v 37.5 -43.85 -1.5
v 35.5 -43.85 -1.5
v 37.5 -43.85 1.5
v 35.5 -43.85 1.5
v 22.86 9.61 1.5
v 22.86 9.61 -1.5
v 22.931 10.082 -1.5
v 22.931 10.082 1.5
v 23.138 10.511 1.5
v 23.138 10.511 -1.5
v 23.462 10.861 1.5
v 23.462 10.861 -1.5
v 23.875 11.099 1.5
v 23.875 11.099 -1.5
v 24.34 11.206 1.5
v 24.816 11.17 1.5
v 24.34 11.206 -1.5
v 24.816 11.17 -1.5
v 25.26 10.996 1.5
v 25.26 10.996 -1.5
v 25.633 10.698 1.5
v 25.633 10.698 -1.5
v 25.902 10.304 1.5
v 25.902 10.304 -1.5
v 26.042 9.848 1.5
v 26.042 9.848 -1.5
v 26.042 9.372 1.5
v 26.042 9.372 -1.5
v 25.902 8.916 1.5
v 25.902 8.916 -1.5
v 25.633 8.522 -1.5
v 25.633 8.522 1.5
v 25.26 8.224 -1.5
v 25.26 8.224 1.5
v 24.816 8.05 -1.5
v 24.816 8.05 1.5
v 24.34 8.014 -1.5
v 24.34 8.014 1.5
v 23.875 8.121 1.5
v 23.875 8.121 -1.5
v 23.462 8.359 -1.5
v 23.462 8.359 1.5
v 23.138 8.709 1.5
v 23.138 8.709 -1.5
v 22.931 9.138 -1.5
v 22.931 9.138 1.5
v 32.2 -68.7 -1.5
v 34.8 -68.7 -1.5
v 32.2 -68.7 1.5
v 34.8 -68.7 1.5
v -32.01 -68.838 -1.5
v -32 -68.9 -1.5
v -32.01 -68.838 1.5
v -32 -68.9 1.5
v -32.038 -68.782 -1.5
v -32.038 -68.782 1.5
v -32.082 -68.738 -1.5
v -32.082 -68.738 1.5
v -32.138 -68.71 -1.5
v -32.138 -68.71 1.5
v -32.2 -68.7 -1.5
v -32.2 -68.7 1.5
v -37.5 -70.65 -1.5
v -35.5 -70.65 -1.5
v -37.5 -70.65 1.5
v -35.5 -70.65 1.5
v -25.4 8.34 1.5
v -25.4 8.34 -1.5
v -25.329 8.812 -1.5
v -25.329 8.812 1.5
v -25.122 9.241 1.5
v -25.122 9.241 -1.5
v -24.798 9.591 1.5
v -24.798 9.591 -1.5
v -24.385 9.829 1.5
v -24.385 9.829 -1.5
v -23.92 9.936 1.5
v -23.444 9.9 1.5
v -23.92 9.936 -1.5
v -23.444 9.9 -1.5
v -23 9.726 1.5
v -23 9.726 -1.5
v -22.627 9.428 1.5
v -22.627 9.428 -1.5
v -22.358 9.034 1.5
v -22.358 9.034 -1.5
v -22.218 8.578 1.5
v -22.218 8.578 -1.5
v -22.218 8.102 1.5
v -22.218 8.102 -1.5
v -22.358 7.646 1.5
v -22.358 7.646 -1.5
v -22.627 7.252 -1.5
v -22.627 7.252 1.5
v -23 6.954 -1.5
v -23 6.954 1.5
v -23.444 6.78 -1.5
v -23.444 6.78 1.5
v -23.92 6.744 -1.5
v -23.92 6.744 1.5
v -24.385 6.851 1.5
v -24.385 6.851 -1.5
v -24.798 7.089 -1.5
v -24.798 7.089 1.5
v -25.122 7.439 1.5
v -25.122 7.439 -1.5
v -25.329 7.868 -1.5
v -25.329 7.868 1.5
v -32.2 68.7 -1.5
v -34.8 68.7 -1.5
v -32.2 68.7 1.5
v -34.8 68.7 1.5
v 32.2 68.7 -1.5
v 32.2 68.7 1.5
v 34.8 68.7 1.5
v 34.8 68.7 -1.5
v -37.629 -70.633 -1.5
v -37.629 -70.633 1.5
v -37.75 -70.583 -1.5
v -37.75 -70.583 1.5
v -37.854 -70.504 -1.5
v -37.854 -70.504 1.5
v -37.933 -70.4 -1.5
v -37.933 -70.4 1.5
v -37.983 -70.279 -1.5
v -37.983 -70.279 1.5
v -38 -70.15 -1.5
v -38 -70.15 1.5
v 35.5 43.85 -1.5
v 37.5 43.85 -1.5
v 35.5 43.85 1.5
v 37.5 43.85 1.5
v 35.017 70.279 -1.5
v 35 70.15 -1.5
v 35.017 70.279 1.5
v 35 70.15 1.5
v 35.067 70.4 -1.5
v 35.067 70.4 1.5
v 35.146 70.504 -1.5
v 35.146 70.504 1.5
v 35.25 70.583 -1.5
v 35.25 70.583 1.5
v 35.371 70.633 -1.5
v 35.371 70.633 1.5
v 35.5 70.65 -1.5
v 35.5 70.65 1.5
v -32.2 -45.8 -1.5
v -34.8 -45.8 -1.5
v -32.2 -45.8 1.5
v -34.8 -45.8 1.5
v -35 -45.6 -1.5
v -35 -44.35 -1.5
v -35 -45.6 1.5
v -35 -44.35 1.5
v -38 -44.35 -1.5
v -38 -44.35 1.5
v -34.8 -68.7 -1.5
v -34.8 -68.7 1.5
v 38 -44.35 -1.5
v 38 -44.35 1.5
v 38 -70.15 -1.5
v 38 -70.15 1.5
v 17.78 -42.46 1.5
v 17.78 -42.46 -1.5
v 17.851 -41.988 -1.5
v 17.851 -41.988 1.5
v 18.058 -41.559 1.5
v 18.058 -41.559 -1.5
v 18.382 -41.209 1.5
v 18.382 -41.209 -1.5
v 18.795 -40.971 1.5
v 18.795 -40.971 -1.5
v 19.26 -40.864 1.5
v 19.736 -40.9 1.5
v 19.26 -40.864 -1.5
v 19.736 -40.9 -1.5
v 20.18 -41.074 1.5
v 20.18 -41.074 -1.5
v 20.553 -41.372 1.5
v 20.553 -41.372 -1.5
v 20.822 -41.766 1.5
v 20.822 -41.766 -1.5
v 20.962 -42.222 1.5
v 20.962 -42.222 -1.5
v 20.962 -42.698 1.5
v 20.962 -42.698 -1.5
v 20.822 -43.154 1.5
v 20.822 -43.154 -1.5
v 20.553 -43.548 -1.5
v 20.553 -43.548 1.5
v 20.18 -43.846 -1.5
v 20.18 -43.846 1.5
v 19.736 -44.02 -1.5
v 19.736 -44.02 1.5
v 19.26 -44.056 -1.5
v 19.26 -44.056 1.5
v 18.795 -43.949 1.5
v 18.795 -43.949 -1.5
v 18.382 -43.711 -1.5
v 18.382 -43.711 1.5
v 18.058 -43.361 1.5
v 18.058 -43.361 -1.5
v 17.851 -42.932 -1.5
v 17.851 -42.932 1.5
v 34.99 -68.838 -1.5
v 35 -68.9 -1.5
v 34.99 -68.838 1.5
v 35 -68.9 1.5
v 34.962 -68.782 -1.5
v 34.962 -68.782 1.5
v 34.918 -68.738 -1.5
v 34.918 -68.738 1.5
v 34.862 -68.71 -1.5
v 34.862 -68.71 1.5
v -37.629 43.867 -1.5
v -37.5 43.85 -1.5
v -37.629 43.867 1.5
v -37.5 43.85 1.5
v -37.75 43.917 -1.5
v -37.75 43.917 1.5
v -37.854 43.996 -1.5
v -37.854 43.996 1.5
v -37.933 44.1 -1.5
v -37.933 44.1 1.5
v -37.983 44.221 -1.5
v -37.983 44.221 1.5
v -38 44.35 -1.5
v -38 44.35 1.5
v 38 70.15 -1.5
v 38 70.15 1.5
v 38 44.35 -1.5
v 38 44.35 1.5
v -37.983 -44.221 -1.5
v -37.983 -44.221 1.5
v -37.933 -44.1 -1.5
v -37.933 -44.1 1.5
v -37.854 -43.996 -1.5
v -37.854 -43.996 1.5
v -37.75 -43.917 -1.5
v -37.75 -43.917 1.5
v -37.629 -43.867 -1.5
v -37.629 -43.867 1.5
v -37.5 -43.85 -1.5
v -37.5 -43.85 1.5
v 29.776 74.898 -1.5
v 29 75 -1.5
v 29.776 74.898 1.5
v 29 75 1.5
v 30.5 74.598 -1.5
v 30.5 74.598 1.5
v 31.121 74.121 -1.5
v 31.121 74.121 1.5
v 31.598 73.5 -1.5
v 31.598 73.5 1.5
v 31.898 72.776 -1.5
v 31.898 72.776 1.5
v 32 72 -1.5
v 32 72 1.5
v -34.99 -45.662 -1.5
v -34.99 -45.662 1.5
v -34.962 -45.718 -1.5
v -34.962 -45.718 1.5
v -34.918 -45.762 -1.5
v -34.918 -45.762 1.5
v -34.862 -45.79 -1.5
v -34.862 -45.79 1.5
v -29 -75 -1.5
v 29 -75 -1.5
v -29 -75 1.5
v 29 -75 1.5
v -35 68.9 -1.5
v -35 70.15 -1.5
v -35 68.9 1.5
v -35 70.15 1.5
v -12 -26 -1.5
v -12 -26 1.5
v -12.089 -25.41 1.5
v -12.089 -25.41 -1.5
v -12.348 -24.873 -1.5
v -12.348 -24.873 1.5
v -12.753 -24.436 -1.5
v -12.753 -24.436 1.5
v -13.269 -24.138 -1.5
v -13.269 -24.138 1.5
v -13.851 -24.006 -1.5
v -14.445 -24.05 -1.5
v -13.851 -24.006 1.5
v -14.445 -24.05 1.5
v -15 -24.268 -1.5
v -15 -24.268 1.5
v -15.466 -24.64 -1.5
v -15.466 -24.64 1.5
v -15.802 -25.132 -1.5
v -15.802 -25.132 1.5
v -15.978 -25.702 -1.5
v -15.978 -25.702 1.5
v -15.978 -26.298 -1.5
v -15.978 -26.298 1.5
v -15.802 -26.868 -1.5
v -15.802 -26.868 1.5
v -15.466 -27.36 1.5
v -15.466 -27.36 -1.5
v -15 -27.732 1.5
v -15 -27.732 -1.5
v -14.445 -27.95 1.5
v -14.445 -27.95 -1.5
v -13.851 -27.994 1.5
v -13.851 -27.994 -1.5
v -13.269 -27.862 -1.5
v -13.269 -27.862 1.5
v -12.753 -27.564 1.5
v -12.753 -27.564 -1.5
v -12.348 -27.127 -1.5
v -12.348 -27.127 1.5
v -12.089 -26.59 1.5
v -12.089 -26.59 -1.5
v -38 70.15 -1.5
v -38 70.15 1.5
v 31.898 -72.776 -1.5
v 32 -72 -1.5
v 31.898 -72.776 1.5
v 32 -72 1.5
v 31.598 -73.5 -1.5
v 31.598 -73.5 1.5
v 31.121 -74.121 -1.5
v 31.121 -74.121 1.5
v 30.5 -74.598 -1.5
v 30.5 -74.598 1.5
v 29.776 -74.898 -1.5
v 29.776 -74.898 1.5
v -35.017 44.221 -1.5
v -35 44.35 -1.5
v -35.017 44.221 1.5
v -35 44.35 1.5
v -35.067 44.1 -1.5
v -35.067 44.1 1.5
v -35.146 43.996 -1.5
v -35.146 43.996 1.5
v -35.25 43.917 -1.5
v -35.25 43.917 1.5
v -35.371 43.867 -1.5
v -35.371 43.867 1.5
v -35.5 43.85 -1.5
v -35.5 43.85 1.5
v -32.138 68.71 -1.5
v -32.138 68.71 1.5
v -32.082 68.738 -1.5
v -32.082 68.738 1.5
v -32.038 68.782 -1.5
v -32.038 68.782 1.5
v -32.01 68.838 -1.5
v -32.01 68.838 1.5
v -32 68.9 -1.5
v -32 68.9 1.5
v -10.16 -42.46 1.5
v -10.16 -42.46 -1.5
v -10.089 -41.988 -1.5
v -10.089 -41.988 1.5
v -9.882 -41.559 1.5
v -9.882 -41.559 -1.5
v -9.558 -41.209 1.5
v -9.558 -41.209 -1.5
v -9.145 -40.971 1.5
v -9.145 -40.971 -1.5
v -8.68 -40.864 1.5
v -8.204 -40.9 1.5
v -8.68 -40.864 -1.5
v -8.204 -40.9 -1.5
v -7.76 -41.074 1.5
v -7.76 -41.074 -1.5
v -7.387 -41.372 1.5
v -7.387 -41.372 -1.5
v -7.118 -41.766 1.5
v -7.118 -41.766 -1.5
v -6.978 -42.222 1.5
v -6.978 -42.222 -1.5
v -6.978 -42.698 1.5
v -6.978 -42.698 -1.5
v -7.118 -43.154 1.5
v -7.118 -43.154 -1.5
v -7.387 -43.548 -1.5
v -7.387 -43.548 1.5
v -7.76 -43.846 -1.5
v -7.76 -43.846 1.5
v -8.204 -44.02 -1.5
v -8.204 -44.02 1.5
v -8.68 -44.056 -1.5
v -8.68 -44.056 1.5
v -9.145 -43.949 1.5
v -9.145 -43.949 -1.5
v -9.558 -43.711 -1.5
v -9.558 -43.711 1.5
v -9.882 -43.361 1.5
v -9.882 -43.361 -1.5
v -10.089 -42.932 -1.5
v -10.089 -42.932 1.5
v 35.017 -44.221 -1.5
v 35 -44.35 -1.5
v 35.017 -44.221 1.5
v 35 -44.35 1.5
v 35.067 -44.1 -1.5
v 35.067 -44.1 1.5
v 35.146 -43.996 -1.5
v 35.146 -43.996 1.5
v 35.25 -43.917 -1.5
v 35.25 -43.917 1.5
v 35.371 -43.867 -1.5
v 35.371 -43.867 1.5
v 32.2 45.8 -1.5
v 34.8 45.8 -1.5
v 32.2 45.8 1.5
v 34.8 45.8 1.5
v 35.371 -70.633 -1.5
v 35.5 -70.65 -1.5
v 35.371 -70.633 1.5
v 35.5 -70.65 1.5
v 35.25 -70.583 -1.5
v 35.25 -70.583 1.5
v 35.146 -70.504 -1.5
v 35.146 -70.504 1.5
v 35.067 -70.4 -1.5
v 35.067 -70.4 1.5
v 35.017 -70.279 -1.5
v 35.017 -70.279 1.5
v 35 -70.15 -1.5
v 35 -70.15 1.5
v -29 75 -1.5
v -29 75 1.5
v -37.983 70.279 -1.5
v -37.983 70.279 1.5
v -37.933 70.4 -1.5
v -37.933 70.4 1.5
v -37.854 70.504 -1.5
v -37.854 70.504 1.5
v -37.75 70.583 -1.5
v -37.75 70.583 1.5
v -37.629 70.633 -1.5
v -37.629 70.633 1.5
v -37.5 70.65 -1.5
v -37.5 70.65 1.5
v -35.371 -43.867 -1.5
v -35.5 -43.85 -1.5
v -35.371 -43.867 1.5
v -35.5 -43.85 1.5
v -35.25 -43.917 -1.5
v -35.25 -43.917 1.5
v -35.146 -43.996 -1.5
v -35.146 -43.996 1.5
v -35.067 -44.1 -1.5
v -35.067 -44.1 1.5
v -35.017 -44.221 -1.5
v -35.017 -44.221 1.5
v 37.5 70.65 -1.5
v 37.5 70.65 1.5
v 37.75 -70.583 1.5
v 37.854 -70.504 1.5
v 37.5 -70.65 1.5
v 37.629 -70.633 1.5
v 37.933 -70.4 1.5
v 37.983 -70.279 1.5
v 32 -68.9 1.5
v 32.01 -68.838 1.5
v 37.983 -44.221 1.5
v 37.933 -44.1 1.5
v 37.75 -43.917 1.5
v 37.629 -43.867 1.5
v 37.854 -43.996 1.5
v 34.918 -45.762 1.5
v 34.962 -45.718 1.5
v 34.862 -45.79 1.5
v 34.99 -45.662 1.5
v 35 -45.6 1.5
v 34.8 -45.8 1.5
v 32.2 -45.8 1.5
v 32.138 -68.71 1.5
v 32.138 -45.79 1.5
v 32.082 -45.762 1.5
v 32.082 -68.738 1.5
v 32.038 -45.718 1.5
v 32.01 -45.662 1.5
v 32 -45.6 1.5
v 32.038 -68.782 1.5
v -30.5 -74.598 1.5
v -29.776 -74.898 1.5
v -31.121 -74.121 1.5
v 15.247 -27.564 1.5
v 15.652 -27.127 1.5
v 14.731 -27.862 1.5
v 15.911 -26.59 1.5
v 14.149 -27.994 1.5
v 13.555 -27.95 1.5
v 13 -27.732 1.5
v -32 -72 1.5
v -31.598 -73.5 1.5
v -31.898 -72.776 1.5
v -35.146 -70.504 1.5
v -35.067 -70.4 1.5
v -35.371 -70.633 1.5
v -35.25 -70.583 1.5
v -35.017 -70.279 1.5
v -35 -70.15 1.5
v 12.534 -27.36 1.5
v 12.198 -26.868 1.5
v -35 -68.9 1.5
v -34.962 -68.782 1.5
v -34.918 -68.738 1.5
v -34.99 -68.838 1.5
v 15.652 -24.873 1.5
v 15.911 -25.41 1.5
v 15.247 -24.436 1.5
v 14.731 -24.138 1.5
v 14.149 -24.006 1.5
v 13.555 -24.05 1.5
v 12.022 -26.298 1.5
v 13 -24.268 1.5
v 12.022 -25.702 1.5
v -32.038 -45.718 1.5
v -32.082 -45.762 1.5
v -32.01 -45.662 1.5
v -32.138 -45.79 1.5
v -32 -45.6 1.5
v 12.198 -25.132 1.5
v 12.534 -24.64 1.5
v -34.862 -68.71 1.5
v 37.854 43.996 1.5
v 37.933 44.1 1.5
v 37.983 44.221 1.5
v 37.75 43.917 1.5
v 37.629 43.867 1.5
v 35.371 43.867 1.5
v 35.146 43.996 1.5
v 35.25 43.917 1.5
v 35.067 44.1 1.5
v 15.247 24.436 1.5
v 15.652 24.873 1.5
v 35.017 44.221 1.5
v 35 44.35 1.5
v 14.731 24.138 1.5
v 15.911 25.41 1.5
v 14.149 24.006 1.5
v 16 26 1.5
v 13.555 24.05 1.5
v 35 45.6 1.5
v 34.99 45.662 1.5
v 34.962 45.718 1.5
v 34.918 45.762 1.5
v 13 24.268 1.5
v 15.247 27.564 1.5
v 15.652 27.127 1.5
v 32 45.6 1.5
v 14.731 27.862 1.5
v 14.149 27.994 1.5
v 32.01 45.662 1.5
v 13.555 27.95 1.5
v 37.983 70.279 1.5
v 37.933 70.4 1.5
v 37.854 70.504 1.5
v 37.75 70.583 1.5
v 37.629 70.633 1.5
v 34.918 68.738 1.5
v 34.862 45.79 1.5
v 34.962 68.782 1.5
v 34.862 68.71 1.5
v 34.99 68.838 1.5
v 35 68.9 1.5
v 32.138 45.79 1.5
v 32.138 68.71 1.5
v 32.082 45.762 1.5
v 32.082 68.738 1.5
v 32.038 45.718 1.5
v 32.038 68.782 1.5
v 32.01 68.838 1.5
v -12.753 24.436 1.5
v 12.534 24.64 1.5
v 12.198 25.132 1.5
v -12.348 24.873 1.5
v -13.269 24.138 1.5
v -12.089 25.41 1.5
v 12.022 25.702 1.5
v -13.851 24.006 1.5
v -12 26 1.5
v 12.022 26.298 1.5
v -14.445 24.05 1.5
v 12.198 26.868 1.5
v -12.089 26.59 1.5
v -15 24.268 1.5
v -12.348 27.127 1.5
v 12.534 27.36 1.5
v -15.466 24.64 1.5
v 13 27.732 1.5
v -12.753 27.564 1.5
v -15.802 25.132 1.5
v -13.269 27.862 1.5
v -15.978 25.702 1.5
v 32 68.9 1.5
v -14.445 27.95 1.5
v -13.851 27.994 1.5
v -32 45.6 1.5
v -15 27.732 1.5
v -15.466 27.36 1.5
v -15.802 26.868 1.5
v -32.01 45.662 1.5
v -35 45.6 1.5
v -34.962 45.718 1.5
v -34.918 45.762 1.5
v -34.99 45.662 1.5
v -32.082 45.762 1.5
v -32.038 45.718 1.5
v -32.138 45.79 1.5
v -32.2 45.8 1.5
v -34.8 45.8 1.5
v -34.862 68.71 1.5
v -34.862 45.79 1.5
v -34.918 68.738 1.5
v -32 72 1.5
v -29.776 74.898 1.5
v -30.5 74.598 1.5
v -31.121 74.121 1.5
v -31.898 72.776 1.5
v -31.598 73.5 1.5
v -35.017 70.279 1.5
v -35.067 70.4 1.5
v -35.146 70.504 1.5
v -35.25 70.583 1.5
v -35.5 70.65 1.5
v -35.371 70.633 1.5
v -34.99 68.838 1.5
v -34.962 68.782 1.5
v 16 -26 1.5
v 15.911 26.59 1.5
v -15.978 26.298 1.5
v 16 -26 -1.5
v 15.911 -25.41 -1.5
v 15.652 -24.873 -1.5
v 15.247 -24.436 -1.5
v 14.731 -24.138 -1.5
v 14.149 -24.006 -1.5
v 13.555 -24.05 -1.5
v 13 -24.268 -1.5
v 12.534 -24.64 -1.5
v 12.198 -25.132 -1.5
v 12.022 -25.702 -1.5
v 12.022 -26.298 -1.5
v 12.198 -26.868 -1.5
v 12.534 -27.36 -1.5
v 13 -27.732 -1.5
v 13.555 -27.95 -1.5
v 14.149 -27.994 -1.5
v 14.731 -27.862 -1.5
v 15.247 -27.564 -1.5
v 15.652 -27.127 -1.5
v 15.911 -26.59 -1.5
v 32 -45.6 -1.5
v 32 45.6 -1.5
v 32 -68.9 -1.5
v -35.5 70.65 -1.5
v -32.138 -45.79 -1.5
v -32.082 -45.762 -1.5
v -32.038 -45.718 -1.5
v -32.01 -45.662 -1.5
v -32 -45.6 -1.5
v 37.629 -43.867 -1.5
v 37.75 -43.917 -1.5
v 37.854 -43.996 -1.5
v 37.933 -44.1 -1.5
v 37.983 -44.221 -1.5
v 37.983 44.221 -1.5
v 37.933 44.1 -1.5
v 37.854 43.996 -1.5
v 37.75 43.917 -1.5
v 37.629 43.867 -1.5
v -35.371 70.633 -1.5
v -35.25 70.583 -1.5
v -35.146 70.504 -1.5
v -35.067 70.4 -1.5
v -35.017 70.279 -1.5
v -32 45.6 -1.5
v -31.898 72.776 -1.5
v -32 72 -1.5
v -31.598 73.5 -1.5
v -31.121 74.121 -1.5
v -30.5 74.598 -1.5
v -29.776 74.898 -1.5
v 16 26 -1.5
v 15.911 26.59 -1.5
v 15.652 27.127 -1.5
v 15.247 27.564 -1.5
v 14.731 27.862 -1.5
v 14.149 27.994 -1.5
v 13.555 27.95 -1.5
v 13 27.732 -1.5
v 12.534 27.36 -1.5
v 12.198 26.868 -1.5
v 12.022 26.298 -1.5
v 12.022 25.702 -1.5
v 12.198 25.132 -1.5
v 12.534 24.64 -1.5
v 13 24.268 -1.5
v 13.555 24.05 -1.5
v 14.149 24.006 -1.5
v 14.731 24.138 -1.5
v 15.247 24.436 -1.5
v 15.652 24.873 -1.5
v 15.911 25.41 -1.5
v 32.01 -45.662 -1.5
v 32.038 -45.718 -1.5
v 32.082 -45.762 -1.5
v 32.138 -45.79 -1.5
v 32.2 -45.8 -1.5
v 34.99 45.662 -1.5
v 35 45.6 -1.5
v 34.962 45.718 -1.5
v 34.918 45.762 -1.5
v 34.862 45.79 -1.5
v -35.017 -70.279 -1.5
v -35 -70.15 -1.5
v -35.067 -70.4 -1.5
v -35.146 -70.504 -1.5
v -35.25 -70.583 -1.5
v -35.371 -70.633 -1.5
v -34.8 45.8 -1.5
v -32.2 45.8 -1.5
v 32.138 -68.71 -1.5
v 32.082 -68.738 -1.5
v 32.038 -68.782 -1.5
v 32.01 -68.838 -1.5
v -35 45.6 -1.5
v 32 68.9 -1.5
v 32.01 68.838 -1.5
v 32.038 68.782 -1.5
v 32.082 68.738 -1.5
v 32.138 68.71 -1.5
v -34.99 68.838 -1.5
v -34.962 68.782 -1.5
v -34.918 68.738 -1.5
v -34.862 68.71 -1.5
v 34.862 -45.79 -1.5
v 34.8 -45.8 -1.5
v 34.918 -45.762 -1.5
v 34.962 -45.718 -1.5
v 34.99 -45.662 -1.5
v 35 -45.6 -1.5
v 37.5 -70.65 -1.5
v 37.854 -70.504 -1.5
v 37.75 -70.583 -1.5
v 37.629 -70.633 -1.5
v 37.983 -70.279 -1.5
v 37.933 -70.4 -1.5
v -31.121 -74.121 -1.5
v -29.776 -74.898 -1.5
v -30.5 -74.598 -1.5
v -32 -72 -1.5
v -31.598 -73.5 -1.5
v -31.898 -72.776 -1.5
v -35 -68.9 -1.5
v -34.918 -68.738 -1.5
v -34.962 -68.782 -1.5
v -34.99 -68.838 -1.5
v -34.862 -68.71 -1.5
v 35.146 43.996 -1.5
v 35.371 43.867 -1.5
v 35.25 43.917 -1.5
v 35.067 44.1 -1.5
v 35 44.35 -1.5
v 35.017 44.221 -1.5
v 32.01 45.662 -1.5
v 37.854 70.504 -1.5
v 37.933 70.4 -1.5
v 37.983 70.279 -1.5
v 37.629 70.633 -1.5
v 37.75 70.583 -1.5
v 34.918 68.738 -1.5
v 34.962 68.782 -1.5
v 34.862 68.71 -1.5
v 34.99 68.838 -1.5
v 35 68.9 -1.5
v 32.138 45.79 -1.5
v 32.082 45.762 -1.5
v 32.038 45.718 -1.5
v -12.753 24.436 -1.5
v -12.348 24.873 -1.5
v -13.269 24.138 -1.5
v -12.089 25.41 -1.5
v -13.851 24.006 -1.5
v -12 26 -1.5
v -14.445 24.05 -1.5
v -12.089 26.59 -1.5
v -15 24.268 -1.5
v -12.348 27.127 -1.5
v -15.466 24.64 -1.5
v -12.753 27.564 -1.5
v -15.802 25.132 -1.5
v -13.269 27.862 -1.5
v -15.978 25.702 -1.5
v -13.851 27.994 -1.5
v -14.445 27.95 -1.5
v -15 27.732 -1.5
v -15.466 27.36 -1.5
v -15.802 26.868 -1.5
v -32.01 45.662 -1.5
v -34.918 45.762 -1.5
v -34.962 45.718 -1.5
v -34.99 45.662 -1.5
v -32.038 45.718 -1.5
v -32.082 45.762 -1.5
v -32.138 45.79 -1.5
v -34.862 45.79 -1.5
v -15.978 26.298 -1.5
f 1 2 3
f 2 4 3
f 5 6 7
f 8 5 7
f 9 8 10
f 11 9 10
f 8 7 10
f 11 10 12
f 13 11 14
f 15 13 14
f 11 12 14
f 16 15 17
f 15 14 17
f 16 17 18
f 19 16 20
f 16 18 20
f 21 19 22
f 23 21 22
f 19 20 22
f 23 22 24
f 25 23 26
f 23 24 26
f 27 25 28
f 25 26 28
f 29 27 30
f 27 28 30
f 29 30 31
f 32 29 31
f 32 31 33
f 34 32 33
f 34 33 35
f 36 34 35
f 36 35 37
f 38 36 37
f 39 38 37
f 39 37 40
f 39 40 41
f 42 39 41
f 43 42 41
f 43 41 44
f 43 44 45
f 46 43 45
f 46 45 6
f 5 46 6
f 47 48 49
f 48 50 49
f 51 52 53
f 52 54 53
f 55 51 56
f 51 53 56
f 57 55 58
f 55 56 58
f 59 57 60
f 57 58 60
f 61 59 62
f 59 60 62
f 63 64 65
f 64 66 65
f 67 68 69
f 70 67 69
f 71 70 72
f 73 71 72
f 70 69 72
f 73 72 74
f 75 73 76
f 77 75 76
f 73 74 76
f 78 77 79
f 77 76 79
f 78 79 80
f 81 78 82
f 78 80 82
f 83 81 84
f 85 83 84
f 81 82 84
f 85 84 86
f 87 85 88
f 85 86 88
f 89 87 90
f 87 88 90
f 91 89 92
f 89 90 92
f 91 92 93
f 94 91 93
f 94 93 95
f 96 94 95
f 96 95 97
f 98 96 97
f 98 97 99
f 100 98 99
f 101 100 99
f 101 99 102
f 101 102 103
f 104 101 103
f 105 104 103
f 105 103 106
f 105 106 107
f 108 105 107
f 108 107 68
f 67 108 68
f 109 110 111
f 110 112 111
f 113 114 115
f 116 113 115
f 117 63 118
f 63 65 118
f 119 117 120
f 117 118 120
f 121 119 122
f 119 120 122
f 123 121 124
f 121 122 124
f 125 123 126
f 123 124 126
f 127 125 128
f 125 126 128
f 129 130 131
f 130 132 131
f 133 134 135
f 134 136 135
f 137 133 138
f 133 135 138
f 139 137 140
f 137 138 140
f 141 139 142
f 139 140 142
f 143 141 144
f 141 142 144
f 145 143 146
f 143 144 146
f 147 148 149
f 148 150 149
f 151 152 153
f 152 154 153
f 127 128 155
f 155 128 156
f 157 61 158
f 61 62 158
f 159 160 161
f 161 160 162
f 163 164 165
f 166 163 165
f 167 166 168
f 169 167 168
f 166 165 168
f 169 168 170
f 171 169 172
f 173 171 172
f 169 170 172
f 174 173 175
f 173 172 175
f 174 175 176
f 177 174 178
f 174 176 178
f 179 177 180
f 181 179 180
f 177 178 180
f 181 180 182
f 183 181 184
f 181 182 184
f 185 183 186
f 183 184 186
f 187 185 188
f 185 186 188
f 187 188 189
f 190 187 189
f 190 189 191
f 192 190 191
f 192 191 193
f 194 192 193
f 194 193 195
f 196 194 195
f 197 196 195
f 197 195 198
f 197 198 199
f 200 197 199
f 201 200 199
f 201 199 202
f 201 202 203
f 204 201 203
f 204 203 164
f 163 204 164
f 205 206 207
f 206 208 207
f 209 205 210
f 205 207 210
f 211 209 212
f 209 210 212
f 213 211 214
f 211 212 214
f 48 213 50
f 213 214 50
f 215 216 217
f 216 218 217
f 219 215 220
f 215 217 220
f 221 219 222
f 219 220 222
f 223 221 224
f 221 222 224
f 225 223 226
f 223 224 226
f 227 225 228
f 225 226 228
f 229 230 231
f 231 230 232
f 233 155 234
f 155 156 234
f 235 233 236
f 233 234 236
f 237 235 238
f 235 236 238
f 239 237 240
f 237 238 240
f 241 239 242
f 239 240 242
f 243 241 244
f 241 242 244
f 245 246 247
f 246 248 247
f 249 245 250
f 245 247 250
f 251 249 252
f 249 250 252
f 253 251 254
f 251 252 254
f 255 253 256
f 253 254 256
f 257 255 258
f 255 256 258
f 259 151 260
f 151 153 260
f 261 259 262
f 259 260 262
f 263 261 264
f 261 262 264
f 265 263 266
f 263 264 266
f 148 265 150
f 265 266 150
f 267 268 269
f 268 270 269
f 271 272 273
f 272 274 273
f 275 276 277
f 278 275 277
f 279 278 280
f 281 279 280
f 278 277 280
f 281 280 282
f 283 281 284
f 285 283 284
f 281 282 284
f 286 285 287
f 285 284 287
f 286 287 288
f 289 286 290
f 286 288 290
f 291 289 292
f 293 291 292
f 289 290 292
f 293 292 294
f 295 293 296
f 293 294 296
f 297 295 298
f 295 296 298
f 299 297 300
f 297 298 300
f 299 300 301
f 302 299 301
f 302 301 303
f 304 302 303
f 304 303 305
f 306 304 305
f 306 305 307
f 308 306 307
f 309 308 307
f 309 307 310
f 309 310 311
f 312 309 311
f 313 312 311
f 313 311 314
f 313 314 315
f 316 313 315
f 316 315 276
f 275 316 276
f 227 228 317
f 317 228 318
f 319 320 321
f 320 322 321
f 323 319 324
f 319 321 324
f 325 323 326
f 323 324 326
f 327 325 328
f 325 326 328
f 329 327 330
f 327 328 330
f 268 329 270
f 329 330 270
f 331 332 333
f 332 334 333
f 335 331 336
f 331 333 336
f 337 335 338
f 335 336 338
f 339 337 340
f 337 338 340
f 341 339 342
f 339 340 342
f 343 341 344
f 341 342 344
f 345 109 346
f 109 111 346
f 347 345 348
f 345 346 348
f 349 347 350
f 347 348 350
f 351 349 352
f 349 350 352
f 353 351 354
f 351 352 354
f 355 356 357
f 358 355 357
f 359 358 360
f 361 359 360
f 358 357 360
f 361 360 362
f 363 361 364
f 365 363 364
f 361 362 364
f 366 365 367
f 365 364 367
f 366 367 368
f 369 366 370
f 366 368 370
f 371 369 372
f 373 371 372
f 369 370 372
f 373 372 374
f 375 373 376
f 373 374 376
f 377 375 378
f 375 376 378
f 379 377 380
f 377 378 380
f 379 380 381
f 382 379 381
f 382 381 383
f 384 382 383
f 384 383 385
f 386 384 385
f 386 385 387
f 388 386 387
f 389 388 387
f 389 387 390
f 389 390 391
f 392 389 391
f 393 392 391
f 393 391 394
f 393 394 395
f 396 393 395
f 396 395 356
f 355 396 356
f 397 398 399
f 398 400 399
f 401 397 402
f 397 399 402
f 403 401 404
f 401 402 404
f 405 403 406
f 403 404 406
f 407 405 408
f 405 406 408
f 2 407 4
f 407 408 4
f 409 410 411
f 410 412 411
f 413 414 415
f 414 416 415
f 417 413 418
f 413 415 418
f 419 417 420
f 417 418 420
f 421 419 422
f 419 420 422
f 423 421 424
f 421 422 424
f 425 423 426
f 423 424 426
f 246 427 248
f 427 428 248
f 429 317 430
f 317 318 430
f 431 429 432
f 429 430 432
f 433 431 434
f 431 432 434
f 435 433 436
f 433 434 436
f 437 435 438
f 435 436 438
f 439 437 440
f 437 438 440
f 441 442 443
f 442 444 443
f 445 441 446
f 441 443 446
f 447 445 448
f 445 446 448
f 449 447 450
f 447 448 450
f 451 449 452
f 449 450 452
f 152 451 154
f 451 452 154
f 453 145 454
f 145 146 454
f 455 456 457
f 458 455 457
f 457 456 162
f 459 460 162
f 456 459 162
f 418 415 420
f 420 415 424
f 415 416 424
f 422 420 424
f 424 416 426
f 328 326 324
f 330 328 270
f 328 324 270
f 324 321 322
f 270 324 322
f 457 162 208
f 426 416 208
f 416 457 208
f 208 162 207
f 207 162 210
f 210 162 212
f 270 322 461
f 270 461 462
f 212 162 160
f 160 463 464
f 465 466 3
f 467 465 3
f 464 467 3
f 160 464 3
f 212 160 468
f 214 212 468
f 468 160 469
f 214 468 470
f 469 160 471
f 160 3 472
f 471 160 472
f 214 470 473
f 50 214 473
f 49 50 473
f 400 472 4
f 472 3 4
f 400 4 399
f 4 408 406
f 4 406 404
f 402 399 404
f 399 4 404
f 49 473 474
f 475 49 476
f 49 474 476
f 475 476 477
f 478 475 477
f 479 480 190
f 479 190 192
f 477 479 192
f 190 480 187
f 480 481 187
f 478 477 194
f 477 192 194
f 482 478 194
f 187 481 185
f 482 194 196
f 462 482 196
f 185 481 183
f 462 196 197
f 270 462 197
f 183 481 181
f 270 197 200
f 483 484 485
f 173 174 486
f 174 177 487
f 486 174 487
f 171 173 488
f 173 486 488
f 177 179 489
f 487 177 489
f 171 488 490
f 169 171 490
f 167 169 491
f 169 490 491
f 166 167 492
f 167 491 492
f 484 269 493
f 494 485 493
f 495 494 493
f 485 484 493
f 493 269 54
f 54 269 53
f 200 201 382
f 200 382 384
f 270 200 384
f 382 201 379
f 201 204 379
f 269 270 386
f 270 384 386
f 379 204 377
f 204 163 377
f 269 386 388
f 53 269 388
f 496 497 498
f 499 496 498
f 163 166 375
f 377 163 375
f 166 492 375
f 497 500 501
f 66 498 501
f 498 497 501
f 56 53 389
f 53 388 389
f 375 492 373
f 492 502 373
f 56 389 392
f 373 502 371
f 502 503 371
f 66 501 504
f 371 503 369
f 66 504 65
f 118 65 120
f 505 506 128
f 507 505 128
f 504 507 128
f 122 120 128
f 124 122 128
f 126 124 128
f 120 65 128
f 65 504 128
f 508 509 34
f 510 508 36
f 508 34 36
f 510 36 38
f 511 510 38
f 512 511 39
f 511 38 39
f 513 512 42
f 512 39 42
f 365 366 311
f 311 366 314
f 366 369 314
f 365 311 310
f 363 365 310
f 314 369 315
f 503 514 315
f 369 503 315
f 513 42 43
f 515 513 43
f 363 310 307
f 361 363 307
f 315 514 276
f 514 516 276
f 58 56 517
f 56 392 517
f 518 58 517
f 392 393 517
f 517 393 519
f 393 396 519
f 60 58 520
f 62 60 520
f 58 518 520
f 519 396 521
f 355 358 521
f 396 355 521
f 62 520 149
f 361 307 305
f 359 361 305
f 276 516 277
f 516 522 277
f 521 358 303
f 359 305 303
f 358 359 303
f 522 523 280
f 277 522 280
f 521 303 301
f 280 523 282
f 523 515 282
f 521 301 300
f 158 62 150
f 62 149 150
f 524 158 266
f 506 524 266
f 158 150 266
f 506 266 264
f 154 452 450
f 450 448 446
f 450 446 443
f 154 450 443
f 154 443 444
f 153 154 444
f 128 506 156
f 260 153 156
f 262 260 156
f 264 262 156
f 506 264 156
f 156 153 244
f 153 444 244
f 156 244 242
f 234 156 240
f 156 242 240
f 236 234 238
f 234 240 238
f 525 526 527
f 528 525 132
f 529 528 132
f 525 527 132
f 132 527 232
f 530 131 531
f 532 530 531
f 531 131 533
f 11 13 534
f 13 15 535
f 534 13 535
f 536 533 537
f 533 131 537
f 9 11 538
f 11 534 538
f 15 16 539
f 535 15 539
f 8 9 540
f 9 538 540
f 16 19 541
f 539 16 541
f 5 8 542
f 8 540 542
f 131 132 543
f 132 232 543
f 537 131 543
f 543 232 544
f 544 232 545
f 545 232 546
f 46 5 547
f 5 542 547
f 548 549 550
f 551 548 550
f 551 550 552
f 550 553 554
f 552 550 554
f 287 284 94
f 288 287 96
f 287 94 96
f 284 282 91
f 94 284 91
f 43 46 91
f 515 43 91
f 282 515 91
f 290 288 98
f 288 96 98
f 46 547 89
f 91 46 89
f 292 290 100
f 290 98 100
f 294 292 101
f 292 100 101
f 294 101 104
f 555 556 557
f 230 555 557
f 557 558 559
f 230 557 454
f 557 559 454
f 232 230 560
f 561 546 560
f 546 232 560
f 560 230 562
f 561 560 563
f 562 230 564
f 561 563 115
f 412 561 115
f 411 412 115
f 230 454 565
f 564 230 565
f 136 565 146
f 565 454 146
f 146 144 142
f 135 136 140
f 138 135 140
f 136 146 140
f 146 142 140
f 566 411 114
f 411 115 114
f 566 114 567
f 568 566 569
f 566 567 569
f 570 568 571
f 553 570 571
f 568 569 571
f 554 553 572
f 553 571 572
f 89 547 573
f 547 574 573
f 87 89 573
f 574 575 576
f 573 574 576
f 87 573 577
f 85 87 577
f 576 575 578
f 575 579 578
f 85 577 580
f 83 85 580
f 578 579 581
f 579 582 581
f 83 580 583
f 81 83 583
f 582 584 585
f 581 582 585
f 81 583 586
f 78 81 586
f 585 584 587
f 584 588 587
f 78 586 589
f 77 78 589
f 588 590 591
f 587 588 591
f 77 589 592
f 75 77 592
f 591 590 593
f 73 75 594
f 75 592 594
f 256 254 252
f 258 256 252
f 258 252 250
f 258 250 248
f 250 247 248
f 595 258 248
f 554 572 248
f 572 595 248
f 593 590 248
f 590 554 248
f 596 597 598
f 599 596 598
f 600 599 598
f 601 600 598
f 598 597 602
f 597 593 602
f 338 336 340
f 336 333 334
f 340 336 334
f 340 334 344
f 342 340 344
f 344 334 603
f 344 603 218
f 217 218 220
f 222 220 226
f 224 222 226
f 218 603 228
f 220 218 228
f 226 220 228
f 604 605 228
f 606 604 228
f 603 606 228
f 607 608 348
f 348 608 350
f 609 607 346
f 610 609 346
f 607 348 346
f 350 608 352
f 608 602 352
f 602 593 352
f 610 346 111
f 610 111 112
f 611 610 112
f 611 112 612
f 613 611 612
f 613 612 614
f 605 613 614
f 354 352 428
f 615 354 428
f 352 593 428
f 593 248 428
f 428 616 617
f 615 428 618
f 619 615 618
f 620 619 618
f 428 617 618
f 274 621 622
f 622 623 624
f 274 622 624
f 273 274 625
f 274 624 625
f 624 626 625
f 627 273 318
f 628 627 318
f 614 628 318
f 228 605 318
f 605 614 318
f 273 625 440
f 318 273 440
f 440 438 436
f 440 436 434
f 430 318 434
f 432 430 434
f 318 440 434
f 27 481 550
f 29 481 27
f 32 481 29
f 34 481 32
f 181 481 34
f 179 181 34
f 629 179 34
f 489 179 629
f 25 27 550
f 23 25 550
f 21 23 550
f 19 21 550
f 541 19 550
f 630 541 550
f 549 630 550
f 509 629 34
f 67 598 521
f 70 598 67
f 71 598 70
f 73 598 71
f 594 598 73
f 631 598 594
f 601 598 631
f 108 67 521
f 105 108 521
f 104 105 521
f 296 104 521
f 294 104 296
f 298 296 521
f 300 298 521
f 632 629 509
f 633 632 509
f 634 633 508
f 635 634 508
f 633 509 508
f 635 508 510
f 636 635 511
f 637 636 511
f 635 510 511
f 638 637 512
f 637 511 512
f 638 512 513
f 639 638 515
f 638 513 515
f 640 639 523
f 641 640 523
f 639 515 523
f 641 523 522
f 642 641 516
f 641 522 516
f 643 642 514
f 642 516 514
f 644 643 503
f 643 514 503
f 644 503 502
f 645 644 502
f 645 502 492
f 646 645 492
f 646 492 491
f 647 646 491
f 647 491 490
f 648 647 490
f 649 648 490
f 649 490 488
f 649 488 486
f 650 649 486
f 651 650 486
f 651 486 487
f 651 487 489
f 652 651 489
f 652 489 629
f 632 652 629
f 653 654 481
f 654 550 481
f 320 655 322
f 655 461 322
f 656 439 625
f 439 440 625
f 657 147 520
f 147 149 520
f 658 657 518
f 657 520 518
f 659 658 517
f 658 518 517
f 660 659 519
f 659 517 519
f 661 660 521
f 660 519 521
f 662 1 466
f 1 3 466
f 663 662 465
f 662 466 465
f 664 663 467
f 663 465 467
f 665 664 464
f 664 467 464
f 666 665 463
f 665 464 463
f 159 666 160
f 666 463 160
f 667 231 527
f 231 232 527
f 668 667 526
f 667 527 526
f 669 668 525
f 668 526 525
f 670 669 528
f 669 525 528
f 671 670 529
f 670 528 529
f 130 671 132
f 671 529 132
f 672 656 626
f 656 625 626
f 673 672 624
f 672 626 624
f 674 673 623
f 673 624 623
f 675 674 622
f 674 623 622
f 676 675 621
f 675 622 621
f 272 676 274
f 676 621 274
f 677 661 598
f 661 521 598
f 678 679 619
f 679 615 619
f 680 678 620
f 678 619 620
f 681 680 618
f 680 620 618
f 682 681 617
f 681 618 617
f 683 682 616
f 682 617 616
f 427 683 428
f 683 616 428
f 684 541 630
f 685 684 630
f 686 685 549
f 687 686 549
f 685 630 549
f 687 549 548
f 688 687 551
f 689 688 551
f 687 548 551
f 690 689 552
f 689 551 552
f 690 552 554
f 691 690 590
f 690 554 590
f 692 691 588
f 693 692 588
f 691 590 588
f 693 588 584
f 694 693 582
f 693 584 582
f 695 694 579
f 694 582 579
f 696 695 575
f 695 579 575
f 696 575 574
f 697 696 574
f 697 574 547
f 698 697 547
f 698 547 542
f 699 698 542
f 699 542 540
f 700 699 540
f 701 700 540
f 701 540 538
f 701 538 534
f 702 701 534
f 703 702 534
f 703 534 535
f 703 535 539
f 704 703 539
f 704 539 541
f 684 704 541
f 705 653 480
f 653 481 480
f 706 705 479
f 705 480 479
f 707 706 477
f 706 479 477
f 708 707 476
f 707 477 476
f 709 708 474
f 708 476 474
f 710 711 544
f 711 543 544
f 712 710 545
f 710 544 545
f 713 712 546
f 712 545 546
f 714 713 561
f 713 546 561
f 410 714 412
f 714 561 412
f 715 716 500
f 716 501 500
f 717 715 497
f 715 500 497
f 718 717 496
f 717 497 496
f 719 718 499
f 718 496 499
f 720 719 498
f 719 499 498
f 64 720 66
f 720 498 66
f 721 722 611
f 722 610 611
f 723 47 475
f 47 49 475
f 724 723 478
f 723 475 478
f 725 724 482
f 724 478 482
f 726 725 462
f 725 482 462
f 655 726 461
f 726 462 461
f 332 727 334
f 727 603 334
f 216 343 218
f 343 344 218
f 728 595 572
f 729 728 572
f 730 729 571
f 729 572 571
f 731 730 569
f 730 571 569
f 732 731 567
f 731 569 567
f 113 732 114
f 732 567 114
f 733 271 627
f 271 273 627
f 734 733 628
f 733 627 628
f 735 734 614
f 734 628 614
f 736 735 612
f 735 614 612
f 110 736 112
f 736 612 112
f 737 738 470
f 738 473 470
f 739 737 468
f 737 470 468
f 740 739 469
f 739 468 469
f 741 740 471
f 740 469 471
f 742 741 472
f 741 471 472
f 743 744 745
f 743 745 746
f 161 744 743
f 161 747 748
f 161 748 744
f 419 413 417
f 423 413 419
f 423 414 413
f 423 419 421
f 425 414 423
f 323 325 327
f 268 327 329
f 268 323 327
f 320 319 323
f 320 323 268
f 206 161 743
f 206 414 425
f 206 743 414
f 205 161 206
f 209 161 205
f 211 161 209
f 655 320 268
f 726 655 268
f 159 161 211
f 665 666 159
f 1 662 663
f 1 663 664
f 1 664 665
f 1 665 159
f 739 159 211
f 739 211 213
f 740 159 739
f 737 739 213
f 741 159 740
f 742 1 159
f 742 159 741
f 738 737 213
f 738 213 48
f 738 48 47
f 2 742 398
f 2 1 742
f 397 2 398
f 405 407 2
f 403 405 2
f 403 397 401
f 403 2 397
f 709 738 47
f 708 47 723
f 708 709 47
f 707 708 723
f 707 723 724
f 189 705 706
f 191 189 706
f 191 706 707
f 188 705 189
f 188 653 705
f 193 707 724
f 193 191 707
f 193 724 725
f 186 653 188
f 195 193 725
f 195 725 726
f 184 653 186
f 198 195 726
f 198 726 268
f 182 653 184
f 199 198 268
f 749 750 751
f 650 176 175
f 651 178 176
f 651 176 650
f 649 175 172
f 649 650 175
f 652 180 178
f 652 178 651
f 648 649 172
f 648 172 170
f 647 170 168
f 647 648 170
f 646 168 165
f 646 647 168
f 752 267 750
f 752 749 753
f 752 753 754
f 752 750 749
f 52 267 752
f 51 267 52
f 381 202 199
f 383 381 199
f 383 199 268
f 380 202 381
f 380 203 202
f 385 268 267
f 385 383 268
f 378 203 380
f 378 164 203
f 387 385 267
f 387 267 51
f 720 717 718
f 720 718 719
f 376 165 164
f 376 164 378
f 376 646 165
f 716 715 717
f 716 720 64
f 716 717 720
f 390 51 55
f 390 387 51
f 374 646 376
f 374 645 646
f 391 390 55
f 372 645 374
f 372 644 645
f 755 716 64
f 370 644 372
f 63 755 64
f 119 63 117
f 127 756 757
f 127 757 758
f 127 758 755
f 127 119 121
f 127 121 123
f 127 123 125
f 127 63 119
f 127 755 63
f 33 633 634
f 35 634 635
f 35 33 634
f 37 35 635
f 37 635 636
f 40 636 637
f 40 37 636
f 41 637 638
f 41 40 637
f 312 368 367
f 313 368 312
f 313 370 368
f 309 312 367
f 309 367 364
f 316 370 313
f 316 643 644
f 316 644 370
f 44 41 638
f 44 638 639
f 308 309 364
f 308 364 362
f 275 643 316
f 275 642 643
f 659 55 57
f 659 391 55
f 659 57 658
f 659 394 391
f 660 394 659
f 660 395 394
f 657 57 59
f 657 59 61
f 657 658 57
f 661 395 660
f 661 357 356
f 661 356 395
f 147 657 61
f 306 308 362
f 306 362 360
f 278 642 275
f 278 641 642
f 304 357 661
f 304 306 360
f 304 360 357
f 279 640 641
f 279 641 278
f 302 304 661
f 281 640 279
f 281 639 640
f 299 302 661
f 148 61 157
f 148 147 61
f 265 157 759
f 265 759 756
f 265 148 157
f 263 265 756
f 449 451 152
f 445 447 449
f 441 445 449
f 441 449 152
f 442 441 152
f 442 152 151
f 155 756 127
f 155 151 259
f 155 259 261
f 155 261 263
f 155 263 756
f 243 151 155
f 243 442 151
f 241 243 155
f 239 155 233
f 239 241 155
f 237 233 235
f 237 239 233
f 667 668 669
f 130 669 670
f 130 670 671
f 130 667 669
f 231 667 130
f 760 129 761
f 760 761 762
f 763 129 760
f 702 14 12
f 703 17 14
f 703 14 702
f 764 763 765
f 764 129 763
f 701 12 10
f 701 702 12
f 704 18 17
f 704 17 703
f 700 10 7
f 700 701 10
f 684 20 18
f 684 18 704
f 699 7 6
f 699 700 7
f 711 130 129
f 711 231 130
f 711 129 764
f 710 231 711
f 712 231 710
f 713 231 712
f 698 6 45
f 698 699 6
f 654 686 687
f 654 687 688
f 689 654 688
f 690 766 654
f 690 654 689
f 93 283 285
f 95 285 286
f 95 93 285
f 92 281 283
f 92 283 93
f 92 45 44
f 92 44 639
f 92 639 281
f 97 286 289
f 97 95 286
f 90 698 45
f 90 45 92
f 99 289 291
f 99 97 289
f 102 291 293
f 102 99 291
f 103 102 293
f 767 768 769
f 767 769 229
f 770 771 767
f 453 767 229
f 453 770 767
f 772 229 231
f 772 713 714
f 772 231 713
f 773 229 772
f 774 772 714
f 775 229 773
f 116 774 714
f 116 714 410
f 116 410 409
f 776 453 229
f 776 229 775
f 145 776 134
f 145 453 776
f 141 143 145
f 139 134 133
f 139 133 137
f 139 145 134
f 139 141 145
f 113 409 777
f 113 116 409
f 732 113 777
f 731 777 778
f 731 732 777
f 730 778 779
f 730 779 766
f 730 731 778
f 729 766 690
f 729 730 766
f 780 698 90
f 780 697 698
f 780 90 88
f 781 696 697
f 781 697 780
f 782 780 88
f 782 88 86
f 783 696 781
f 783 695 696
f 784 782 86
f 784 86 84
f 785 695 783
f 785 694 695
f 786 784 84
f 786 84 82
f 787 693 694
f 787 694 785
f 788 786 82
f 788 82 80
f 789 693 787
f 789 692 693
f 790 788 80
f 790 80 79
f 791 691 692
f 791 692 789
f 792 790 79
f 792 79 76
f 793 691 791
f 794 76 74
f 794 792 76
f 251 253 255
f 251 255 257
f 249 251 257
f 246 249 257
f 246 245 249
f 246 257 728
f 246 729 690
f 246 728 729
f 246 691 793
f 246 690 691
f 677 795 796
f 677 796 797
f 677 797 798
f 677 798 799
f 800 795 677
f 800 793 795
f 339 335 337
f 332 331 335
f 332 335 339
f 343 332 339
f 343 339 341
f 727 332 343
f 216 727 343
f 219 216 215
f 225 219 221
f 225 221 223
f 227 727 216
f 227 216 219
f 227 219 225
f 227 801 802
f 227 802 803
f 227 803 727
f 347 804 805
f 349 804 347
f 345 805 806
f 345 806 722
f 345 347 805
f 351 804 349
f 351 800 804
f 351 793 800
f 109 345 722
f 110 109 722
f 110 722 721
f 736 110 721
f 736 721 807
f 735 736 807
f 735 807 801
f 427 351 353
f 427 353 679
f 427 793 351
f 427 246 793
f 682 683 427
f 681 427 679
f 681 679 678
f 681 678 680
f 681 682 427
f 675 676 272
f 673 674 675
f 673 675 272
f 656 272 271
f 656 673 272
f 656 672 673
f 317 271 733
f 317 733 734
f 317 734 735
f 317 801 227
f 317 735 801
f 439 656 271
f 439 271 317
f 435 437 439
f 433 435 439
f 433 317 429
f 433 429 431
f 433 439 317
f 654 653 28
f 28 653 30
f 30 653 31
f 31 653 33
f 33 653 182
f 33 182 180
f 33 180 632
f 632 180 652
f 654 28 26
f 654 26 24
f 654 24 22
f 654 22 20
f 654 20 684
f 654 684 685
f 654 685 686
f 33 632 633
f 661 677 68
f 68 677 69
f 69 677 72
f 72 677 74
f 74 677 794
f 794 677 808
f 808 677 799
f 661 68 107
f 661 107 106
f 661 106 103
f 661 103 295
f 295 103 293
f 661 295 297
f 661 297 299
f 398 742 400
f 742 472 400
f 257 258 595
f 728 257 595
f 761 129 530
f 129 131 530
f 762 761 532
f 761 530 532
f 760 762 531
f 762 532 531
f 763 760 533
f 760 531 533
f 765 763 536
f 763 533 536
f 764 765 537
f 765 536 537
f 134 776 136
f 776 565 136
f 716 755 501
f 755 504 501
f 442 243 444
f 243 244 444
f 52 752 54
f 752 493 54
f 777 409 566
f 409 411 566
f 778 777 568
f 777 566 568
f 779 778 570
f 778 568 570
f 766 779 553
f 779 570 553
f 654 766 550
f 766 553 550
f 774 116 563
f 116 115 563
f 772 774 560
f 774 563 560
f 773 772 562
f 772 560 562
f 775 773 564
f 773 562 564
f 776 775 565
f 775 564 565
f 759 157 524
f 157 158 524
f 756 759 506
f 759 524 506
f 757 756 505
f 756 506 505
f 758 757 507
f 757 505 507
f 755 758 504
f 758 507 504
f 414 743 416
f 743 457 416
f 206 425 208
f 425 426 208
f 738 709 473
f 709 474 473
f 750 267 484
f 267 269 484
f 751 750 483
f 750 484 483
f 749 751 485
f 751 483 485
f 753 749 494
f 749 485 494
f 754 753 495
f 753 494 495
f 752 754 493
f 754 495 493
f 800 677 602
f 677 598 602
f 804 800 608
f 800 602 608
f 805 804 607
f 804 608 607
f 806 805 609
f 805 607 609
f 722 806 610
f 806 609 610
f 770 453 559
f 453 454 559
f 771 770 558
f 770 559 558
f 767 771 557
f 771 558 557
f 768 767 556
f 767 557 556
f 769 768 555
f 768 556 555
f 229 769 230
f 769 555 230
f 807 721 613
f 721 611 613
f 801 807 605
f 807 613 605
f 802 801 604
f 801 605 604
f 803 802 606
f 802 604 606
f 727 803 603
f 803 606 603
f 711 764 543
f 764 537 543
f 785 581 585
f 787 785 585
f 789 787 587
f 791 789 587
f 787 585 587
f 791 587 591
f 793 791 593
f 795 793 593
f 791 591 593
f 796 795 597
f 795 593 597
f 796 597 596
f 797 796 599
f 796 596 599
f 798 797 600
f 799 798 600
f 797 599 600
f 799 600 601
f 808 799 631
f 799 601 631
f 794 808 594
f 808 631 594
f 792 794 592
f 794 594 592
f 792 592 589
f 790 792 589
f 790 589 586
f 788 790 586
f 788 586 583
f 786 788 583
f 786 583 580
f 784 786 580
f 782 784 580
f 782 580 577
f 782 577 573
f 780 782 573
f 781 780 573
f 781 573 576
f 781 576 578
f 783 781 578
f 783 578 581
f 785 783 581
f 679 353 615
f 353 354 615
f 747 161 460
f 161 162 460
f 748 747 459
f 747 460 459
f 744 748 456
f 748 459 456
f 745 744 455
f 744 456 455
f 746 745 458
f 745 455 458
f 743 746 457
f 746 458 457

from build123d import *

# Parameters (mm, degrees)
EXTRUDE_1_DEPTH     = 1.5
CUT_EXTRUDE_1_REACH = 5
SKETCH_2_R          = 1.6
SKETCH_3_R          = 2
CUT_EXTRUDE_2_DEPTH = 10


with BuildPart() as part:
    # 草图1 → 凸台-拉伸1 (new body, symmetric)
    with BuildSketch(Plane.XY):
        with BuildLine():
            Line((32.2, 68.7), (34.8, 68.7))
            ThreePointArc((34.8, 68.7), (34.941421356, 68.758578644), (35, 68.9))
            Line((35, 68.9), (35, 70.15))
            ThreePointArc((35, 70.15), (35.146446609, 70.503553391), (35.5, 70.65))
            Line((35.5, 70.65), (37.5, 70.65))
            ThreePointArc((37.5, 70.65), (37.853553391, 70.503553391), (38, 70.15))
            Line((38, 70.15), (38, 44.35))
            ThreePointArc((38, 44.35), (37.853553391, 43.996446609), (37.5, 43.85))
            Line((37.5, 43.85), (35.5, 43.85))
            ThreePointArc((35.5, 43.85), (35.146446609, 43.996446609), (35, 44.35))
            Line((35, 44.35), (35, 45.6))
            ThreePointArc((35, 45.6), (34.941421356, 45.741421356), (34.8, 45.8))
            Line((34.8, 45.8), (32.2, 45.8))
            ThreePointArc((32.2, 45.8), (32.058578644, 45.741421356), (32, 45.6))
            Line((32, 45.6), (32, -45.6))
            ThreePointArc((32, -45.6), (32.058578644, -45.741421356), (32.2, -45.8))
            Line((32.2, -45.8), (34.8, -45.8))
            ThreePointArc((34.8, -45.8), (34.941421356, -45.741421356), (35, -45.6))
            Line((35, -45.6), (35, -44.35))
            ThreePointArc((35, -44.35), (35.146446609, -43.996446609), (35.5, -43.85))
            Line((35.5, -43.85), (37.5, -43.85))
            ThreePointArc((37.5, -43.85), (37.853553391, -43.996446609), (38, -44.35))
            Line((38, -44.35), (38, -70.15))
            ThreePointArc((38, -70.15), (37.853553391, -70.503553391), (37.5, -70.65))
            Line((37.5, -70.65), (35.5, -70.65))
            ThreePointArc((35.5, -70.65), (35.146446609, -70.503553391), (35, -70.15))
            Line((35, -70.15), (35, -68.9))
            ThreePointArc((35, -68.9), (34.941421356, -68.758578644), (34.8, -68.7))
            Line((34.8, -68.7), (32.2, -68.7))
            ThreePointArc((32.2, -68.7), (32.058578644, -68.758578644), (32, -68.9))
            Line((32, -68.9), (32, -72))
            ThreePointArc((32, -72), (31.121320344, -74.121320344), (29, -75))
            Line((29, -75), (-29, -75))
            ThreePointArc((-29, -75), (-31.121320344, -74.121320344), (-32, -72))
            Line((-32, -72), (-32, -68.9))
            ThreePointArc((-32, -68.9), (-32.058578644, -68.758578644), (-32.2, -68.7))
            Line((-32.2, -68.7), (-34.8, -68.7))
            ThreePointArc((-34.8, -68.7), (-34.941421356, -68.758578644), (-35, -68.9))
            Line((-35, -68.9), (-35, -70.15))
            ThreePointArc((-35, -70.15), (-35.146446609, -70.503553391), (-35.5, -70.65))
            Line((-35.5, -70.65), (-37.5, -70.65))
            ThreePointArc((-37.5, -70.65), (-37.853553391, -70.503553391), (-38, -70.15))
            Line((-38, -70.15), (-38, -44.35))
            ThreePointArc((-38, -44.35), (-37.853553391, -43.996446609), (-37.5, -43.85))
            Line((-37.5, -43.85), (-35.5, -43.85))
            ThreePointArc((-35.5, -43.85), (-35.146446609, -43.996446609), (-35, -44.35))
            Line((-35, -44.35), (-35, -45.6))
            ThreePointArc((-35, -45.6), (-34.941421356, -45.741421356), (-34.8, -45.8))
            Line((-34.8, -45.8), (-32.2, -45.8))
            ThreePointArc((-32.2, -45.8), (-32.058578644, -45.741421356), (-32, -45.6))
            Line((-32, -45.6), (-32, 45.6))
            ThreePointArc((-32, 45.6), (-32.058578644, 45.741421356), (-32.2, 45.8))
            Line((-32.2, 45.8), (-34.8, 45.8))
            ThreePointArc((-34.8, 45.8), (-34.941421356, 45.741421356), (-35, 45.6))
            Line((-35, 45.6), (-35, 44.35))
            ThreePointArc((-35, 44.35), (-35.146446609, 43.996446609), (-35.5, 43.85))
            Line((-35.5, 43.85), (-37.5, 43.85))
            ThreePointArc((-37.5, 43.85), (-37.853553391, 43.996446609), (-38, 44.35))
            Line((-38, 44.35), (-38, 70.15))
            ThreePointArc((-38, 70.15), (-37.853553391, 70.503553391), (-37.5, 70.65))
            Line((-37.5, 70.65), (-35.5, 70.65))
            ThreePointArc((-35.5, 70.65), (-35.146446609, 70.503553391), (-35, 70.15))
            Line((-35, 70.15), (-35, 68.9))
            ThreePointArc((-35, 68.9), (-34.941421356, 68.758578644), (-34.8, 68.7))
            Line((-34.8, 68.7), (-32.2, 68.7))
            ThreePointArc((-32.2, 68.7), (-32.058578644, 68.758578644), (-32, 68.9))
            Line((-32, 68.9), (-32, 72))
            ThreePointArc((-32, 72), (-31.121320344, 74.121320344), (-29, 75))
            Line((-29, 75), (29, 75))
            ThreePointArc((29, 75), (31.121320344, 74.121320344), (32, 72))
            Line((32, 72), (32, 68.9))
            ThreePointArc((32, 68.9), (32.058578644, 68.758578644), (32.2, 68.7))
        make_face()
    extrude(amount=EXTRUDE_1_DEPTH, both=True)

    # 草图2 → 切除-拉伸1 (cut, up to next)
    with BuildSketch(Plane(origin=(0, 0, -1.5), x_dir=(-1, 0, 0), z_dir=(0, 0, -1)), mode=Mode.PRIVATE) as cut_extrude_1_sk1:
        with Locations((23.8, 8.34)):
            Circle(SKETCH_2_R)
    cut_extrude_1_tool1 = extrude(cut_extrude_1_sk1.sketch, amount=-CUT_EXTRUDE_1_REACH, mode=Mode.PRIVATE) & part.part
    add(cut_extrude_1_tool1.solids().sort_by_distance((-23.8, 8.34, -1.5))[0], mode=Mode.SUBTRACT)
    # 草图2 → 切除-拉伸1 (cut, up to next)
    with BuildSketch(Plane(origin=(0, 0, -1.5), x_dir=(-1, 0, 0), z_dir=(0, 0, -1)), mode=Mode.PRIVATE) as cut_extrude_1_sk2:
        with Locations((8.56, -42.46)):
            Circle(SKETCH_2_R)
    cut_extrude_1_tool2 = extrude(cut_extrude_1_sk2.sketch, amount=-CUT_EXTRUDE_1_REACH, mode=Mode.PRIVATE) & part.part
    add(cut_extrude_1_tool2.solids().sort_by_distance((-8.56, -42.46, -1.5))[0], mode=Mode.SUBTRACT)
    # 草图2 → 切除-拉伸1 (cut, up to next)
    with BuildSketch(Plane(origin=(0, 0, -1.5), x_dir=(-1, 0, 0), z_dir=(0, 0, -1)), mode=Mode.PRIVATE) as cut_extrude_1_sk3:
        with Locations((-19.38, -42.46)):
            Circle(SKETCH_2_R)
    cut_extrude_1_tool3 = extrude(cut_extrude_1_sk3.sketch, amount=-CUT_EXTRUDE_1_REACH, mode=Mode.PRIVATE) & part.part
    add(cut_extrude_1_tool3.solids().sort_by_distance((19.38, -42.46, -1.5))[0], mode=Mode.SUBTRACT)
    # 草图2 → 切除-拉伸1 (cut, up to next)
    with BuildSketch(Plane(origin=(0, 0, -1.5), x_dir=(-1, 0, 0), z_dir=(0, 0, -1)), mode=Mode.PRIVATE) as cut_extrude_1_sk4:
        with Locations((-24.46, 9.61)):
            Circle(SKETCH_2_R)
    cut_extrude_1_tool4 = extrude(cut_extrude_1_sk4.sketch, amount=-CUT_EXTRUDE_1_REACH, mode=Mode.PRIVATE) & part.part
    add(cut_extrude_1_tool4.solids().sort_by_distance((24.46, 9.61, -1.5))[0], mode=Mode.SUBTRACT)

    # 草图3 → 切除-拉伸2 (cut)
    with BuildSketch(Plane.XY.offset(1.5)):
        with Locations((14, 26)):
            Circle(SKETCH_3_R)
        with Locations((14, -26)):
            Circle(SKETCH_3_R)
        with Locations((-14, 26)):
            Circle(SKETCH_3_R)
        with Locations((-14, -26)):
            Circle(SKETCH_3_R)
    extrude(amount=-CUT_EXTRUDE_2_DEPTH, mode=Mode.SUBTRACT)


solid = part.part
